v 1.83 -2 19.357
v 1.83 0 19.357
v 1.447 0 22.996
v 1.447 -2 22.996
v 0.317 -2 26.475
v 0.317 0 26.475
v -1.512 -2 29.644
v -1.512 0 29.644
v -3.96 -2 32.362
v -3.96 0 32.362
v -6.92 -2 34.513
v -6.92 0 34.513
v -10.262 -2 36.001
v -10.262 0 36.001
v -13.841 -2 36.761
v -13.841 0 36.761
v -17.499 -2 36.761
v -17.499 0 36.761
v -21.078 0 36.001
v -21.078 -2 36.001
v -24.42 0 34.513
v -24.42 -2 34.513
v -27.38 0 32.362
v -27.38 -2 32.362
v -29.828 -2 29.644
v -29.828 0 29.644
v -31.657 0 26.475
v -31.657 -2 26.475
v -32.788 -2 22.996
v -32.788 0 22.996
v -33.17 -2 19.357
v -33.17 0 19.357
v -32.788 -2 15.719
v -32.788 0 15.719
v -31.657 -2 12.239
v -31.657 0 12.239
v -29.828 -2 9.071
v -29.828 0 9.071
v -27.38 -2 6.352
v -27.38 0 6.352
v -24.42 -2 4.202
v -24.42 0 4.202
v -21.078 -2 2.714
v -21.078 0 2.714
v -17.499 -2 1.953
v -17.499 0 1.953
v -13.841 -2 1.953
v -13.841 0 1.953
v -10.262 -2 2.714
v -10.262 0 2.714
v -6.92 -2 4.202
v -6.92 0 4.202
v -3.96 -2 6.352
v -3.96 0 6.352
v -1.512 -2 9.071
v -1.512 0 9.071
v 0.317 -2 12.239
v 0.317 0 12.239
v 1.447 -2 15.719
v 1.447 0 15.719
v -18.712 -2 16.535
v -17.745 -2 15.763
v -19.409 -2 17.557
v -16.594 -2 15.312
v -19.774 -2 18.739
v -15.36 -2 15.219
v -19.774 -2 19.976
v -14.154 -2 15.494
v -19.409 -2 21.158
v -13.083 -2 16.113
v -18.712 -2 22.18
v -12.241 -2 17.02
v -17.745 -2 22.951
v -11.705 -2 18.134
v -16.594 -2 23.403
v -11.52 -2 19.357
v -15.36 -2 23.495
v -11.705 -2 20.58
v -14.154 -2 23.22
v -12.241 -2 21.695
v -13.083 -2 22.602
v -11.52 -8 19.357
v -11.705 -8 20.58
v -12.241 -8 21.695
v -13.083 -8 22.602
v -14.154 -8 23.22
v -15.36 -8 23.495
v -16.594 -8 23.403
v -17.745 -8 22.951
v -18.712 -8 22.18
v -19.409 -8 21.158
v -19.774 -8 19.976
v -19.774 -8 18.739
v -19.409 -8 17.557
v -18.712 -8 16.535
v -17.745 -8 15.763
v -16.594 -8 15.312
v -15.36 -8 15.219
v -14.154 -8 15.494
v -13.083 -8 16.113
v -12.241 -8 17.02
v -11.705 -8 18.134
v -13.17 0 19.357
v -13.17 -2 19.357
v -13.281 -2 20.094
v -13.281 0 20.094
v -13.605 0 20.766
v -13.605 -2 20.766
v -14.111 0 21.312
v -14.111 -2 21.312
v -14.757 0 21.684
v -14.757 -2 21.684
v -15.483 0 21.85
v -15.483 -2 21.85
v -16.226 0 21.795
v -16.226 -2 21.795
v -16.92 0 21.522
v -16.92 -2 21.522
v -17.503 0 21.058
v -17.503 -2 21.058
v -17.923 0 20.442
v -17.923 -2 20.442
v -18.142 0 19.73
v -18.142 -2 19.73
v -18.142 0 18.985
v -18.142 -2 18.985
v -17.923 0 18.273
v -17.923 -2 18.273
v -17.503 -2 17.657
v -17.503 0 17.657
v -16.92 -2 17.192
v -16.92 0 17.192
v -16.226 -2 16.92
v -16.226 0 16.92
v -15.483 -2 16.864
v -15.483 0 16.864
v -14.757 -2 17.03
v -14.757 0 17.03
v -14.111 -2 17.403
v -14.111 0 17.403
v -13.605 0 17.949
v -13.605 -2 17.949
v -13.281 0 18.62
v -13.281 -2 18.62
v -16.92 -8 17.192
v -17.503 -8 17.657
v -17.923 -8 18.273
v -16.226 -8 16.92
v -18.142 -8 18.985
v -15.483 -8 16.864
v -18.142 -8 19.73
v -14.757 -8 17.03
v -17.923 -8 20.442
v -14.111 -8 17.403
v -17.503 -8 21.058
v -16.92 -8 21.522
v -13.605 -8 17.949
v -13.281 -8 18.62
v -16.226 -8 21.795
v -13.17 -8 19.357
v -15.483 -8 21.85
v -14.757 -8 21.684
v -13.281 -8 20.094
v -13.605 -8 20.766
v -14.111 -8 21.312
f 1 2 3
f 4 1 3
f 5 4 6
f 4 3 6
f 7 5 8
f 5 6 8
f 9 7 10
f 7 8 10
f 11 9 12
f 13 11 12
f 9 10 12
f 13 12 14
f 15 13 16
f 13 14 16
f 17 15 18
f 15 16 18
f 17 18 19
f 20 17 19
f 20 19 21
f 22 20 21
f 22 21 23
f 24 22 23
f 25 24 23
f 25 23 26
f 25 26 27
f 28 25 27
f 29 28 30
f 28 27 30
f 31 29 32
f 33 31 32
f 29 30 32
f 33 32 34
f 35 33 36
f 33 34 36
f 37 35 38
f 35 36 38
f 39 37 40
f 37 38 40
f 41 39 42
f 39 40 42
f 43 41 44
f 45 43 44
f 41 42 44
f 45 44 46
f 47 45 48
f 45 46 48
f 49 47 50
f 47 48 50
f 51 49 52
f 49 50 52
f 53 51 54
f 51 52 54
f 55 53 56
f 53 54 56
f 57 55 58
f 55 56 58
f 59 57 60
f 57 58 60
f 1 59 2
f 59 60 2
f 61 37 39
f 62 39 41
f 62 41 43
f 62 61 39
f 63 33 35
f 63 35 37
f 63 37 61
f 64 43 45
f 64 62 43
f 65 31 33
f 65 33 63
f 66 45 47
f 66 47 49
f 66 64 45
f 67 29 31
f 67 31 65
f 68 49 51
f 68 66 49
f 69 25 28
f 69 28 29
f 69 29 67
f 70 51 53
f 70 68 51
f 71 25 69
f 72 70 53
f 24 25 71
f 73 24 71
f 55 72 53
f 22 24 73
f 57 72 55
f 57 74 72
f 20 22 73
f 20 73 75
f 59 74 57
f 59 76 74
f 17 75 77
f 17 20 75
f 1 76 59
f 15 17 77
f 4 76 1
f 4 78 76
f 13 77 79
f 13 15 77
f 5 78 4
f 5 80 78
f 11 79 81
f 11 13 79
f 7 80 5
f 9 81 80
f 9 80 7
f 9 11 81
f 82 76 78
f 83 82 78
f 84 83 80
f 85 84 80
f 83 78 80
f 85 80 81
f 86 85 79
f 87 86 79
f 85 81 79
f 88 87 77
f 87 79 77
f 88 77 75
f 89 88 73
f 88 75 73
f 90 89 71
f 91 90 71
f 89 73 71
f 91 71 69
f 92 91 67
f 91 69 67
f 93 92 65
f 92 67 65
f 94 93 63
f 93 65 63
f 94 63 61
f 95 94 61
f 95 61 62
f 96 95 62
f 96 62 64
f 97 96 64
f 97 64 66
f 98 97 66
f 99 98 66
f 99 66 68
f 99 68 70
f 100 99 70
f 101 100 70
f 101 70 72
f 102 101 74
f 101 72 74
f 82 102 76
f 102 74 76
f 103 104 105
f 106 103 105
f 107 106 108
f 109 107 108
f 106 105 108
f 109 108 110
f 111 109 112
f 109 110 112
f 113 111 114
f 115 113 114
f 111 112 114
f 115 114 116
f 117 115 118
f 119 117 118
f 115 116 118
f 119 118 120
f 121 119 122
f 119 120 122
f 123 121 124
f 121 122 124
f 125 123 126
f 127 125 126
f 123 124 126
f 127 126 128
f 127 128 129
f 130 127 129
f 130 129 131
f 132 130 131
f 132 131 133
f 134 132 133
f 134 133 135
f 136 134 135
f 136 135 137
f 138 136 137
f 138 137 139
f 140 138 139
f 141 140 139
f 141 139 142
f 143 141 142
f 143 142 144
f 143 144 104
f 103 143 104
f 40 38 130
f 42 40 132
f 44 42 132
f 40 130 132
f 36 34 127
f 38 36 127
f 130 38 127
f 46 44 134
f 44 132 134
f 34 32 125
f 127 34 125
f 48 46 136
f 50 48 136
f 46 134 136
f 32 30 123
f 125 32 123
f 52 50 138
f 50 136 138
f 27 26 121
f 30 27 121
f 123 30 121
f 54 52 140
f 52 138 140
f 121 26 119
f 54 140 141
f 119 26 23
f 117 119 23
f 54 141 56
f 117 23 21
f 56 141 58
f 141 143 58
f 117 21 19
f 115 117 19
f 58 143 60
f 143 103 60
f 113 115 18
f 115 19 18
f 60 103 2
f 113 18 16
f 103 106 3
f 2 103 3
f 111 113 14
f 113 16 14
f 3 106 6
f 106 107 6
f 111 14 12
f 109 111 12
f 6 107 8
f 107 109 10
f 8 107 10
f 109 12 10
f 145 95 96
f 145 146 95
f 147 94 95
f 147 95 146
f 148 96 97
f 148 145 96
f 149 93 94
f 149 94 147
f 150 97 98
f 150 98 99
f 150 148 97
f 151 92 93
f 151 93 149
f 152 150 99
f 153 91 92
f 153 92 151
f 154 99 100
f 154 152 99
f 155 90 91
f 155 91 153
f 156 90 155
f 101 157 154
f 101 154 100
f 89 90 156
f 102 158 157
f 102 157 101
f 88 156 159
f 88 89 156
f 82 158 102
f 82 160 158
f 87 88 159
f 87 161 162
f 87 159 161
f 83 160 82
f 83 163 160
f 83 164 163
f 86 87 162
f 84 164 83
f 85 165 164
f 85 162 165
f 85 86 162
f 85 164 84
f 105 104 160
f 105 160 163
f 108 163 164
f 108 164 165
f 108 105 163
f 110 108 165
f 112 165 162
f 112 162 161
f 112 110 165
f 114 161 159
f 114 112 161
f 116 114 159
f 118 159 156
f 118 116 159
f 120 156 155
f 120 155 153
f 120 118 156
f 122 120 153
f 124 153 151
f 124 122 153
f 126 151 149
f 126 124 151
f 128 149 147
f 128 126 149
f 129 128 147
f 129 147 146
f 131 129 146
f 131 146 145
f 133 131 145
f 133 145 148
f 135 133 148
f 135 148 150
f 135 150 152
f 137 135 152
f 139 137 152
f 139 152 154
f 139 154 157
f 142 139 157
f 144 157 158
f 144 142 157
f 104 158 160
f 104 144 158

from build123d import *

# Parameters (mm, degrees)
F0_R     = 17.5
F1_DEPTH = 2.00000108
F2_R     = 2.5
F3_DEPTH = 6
F6_DEPTH = 8.00100108
F7_R     = 4.1497915573
F7_R_2   = 2.5
F8_DEPTH = 6


# Not quite as in the source:
# - a feature of the source that left no trace in its solid (it failed there, or was rolled back) is left out
# - a feature names something its author has since deleted; it is built from what else it names
# - the program builds the solid bodies; features that only make, move or delete a surface that nothing else refers to are left out


with BuildPart() as f1:
    # F0 (on Front) → F1 (new body)
    with BuildSketch(Plane.XZ):
        with Locations((-15.6701616943, 19.357258454)):
            Circle(F0_R)
    extrude(amount=F1_DEPTH)

    # F2 (on face) → F3 (join)
    with BuildSketch(Plane.XZ.offset(2.00000108)):
        with Locations((-15.6701616943, 19.357258454)):
            Circle(F2_R)
    extrude(amount=F3_DEPTH)

    # F6 (cut, through all): a face of the model
    f6_faces = [f1.faces().sort_by_distance(p)[0] for p in [
        (-15.6701616943, -8.00000108, 19.357258454),
    ]]
    extrude(f6_faces, amount=-F6_DEPTH, mode=Mode.SUBTRACT)

    # F7 (on face) → F8 (join)
    with BuildSketch(Plane.XZ.offset(2.00000108)):
        with Locations((-15.6701616943, 19.357258454)):
            Circle(F7_R)
        with Locations((-15.6701616943, 19.357258454)):
            Circle(F7_R_2, mode=Mode.SUBTRACT)
    extrude(amount=F8_DEPTH)


solid = f1.part
